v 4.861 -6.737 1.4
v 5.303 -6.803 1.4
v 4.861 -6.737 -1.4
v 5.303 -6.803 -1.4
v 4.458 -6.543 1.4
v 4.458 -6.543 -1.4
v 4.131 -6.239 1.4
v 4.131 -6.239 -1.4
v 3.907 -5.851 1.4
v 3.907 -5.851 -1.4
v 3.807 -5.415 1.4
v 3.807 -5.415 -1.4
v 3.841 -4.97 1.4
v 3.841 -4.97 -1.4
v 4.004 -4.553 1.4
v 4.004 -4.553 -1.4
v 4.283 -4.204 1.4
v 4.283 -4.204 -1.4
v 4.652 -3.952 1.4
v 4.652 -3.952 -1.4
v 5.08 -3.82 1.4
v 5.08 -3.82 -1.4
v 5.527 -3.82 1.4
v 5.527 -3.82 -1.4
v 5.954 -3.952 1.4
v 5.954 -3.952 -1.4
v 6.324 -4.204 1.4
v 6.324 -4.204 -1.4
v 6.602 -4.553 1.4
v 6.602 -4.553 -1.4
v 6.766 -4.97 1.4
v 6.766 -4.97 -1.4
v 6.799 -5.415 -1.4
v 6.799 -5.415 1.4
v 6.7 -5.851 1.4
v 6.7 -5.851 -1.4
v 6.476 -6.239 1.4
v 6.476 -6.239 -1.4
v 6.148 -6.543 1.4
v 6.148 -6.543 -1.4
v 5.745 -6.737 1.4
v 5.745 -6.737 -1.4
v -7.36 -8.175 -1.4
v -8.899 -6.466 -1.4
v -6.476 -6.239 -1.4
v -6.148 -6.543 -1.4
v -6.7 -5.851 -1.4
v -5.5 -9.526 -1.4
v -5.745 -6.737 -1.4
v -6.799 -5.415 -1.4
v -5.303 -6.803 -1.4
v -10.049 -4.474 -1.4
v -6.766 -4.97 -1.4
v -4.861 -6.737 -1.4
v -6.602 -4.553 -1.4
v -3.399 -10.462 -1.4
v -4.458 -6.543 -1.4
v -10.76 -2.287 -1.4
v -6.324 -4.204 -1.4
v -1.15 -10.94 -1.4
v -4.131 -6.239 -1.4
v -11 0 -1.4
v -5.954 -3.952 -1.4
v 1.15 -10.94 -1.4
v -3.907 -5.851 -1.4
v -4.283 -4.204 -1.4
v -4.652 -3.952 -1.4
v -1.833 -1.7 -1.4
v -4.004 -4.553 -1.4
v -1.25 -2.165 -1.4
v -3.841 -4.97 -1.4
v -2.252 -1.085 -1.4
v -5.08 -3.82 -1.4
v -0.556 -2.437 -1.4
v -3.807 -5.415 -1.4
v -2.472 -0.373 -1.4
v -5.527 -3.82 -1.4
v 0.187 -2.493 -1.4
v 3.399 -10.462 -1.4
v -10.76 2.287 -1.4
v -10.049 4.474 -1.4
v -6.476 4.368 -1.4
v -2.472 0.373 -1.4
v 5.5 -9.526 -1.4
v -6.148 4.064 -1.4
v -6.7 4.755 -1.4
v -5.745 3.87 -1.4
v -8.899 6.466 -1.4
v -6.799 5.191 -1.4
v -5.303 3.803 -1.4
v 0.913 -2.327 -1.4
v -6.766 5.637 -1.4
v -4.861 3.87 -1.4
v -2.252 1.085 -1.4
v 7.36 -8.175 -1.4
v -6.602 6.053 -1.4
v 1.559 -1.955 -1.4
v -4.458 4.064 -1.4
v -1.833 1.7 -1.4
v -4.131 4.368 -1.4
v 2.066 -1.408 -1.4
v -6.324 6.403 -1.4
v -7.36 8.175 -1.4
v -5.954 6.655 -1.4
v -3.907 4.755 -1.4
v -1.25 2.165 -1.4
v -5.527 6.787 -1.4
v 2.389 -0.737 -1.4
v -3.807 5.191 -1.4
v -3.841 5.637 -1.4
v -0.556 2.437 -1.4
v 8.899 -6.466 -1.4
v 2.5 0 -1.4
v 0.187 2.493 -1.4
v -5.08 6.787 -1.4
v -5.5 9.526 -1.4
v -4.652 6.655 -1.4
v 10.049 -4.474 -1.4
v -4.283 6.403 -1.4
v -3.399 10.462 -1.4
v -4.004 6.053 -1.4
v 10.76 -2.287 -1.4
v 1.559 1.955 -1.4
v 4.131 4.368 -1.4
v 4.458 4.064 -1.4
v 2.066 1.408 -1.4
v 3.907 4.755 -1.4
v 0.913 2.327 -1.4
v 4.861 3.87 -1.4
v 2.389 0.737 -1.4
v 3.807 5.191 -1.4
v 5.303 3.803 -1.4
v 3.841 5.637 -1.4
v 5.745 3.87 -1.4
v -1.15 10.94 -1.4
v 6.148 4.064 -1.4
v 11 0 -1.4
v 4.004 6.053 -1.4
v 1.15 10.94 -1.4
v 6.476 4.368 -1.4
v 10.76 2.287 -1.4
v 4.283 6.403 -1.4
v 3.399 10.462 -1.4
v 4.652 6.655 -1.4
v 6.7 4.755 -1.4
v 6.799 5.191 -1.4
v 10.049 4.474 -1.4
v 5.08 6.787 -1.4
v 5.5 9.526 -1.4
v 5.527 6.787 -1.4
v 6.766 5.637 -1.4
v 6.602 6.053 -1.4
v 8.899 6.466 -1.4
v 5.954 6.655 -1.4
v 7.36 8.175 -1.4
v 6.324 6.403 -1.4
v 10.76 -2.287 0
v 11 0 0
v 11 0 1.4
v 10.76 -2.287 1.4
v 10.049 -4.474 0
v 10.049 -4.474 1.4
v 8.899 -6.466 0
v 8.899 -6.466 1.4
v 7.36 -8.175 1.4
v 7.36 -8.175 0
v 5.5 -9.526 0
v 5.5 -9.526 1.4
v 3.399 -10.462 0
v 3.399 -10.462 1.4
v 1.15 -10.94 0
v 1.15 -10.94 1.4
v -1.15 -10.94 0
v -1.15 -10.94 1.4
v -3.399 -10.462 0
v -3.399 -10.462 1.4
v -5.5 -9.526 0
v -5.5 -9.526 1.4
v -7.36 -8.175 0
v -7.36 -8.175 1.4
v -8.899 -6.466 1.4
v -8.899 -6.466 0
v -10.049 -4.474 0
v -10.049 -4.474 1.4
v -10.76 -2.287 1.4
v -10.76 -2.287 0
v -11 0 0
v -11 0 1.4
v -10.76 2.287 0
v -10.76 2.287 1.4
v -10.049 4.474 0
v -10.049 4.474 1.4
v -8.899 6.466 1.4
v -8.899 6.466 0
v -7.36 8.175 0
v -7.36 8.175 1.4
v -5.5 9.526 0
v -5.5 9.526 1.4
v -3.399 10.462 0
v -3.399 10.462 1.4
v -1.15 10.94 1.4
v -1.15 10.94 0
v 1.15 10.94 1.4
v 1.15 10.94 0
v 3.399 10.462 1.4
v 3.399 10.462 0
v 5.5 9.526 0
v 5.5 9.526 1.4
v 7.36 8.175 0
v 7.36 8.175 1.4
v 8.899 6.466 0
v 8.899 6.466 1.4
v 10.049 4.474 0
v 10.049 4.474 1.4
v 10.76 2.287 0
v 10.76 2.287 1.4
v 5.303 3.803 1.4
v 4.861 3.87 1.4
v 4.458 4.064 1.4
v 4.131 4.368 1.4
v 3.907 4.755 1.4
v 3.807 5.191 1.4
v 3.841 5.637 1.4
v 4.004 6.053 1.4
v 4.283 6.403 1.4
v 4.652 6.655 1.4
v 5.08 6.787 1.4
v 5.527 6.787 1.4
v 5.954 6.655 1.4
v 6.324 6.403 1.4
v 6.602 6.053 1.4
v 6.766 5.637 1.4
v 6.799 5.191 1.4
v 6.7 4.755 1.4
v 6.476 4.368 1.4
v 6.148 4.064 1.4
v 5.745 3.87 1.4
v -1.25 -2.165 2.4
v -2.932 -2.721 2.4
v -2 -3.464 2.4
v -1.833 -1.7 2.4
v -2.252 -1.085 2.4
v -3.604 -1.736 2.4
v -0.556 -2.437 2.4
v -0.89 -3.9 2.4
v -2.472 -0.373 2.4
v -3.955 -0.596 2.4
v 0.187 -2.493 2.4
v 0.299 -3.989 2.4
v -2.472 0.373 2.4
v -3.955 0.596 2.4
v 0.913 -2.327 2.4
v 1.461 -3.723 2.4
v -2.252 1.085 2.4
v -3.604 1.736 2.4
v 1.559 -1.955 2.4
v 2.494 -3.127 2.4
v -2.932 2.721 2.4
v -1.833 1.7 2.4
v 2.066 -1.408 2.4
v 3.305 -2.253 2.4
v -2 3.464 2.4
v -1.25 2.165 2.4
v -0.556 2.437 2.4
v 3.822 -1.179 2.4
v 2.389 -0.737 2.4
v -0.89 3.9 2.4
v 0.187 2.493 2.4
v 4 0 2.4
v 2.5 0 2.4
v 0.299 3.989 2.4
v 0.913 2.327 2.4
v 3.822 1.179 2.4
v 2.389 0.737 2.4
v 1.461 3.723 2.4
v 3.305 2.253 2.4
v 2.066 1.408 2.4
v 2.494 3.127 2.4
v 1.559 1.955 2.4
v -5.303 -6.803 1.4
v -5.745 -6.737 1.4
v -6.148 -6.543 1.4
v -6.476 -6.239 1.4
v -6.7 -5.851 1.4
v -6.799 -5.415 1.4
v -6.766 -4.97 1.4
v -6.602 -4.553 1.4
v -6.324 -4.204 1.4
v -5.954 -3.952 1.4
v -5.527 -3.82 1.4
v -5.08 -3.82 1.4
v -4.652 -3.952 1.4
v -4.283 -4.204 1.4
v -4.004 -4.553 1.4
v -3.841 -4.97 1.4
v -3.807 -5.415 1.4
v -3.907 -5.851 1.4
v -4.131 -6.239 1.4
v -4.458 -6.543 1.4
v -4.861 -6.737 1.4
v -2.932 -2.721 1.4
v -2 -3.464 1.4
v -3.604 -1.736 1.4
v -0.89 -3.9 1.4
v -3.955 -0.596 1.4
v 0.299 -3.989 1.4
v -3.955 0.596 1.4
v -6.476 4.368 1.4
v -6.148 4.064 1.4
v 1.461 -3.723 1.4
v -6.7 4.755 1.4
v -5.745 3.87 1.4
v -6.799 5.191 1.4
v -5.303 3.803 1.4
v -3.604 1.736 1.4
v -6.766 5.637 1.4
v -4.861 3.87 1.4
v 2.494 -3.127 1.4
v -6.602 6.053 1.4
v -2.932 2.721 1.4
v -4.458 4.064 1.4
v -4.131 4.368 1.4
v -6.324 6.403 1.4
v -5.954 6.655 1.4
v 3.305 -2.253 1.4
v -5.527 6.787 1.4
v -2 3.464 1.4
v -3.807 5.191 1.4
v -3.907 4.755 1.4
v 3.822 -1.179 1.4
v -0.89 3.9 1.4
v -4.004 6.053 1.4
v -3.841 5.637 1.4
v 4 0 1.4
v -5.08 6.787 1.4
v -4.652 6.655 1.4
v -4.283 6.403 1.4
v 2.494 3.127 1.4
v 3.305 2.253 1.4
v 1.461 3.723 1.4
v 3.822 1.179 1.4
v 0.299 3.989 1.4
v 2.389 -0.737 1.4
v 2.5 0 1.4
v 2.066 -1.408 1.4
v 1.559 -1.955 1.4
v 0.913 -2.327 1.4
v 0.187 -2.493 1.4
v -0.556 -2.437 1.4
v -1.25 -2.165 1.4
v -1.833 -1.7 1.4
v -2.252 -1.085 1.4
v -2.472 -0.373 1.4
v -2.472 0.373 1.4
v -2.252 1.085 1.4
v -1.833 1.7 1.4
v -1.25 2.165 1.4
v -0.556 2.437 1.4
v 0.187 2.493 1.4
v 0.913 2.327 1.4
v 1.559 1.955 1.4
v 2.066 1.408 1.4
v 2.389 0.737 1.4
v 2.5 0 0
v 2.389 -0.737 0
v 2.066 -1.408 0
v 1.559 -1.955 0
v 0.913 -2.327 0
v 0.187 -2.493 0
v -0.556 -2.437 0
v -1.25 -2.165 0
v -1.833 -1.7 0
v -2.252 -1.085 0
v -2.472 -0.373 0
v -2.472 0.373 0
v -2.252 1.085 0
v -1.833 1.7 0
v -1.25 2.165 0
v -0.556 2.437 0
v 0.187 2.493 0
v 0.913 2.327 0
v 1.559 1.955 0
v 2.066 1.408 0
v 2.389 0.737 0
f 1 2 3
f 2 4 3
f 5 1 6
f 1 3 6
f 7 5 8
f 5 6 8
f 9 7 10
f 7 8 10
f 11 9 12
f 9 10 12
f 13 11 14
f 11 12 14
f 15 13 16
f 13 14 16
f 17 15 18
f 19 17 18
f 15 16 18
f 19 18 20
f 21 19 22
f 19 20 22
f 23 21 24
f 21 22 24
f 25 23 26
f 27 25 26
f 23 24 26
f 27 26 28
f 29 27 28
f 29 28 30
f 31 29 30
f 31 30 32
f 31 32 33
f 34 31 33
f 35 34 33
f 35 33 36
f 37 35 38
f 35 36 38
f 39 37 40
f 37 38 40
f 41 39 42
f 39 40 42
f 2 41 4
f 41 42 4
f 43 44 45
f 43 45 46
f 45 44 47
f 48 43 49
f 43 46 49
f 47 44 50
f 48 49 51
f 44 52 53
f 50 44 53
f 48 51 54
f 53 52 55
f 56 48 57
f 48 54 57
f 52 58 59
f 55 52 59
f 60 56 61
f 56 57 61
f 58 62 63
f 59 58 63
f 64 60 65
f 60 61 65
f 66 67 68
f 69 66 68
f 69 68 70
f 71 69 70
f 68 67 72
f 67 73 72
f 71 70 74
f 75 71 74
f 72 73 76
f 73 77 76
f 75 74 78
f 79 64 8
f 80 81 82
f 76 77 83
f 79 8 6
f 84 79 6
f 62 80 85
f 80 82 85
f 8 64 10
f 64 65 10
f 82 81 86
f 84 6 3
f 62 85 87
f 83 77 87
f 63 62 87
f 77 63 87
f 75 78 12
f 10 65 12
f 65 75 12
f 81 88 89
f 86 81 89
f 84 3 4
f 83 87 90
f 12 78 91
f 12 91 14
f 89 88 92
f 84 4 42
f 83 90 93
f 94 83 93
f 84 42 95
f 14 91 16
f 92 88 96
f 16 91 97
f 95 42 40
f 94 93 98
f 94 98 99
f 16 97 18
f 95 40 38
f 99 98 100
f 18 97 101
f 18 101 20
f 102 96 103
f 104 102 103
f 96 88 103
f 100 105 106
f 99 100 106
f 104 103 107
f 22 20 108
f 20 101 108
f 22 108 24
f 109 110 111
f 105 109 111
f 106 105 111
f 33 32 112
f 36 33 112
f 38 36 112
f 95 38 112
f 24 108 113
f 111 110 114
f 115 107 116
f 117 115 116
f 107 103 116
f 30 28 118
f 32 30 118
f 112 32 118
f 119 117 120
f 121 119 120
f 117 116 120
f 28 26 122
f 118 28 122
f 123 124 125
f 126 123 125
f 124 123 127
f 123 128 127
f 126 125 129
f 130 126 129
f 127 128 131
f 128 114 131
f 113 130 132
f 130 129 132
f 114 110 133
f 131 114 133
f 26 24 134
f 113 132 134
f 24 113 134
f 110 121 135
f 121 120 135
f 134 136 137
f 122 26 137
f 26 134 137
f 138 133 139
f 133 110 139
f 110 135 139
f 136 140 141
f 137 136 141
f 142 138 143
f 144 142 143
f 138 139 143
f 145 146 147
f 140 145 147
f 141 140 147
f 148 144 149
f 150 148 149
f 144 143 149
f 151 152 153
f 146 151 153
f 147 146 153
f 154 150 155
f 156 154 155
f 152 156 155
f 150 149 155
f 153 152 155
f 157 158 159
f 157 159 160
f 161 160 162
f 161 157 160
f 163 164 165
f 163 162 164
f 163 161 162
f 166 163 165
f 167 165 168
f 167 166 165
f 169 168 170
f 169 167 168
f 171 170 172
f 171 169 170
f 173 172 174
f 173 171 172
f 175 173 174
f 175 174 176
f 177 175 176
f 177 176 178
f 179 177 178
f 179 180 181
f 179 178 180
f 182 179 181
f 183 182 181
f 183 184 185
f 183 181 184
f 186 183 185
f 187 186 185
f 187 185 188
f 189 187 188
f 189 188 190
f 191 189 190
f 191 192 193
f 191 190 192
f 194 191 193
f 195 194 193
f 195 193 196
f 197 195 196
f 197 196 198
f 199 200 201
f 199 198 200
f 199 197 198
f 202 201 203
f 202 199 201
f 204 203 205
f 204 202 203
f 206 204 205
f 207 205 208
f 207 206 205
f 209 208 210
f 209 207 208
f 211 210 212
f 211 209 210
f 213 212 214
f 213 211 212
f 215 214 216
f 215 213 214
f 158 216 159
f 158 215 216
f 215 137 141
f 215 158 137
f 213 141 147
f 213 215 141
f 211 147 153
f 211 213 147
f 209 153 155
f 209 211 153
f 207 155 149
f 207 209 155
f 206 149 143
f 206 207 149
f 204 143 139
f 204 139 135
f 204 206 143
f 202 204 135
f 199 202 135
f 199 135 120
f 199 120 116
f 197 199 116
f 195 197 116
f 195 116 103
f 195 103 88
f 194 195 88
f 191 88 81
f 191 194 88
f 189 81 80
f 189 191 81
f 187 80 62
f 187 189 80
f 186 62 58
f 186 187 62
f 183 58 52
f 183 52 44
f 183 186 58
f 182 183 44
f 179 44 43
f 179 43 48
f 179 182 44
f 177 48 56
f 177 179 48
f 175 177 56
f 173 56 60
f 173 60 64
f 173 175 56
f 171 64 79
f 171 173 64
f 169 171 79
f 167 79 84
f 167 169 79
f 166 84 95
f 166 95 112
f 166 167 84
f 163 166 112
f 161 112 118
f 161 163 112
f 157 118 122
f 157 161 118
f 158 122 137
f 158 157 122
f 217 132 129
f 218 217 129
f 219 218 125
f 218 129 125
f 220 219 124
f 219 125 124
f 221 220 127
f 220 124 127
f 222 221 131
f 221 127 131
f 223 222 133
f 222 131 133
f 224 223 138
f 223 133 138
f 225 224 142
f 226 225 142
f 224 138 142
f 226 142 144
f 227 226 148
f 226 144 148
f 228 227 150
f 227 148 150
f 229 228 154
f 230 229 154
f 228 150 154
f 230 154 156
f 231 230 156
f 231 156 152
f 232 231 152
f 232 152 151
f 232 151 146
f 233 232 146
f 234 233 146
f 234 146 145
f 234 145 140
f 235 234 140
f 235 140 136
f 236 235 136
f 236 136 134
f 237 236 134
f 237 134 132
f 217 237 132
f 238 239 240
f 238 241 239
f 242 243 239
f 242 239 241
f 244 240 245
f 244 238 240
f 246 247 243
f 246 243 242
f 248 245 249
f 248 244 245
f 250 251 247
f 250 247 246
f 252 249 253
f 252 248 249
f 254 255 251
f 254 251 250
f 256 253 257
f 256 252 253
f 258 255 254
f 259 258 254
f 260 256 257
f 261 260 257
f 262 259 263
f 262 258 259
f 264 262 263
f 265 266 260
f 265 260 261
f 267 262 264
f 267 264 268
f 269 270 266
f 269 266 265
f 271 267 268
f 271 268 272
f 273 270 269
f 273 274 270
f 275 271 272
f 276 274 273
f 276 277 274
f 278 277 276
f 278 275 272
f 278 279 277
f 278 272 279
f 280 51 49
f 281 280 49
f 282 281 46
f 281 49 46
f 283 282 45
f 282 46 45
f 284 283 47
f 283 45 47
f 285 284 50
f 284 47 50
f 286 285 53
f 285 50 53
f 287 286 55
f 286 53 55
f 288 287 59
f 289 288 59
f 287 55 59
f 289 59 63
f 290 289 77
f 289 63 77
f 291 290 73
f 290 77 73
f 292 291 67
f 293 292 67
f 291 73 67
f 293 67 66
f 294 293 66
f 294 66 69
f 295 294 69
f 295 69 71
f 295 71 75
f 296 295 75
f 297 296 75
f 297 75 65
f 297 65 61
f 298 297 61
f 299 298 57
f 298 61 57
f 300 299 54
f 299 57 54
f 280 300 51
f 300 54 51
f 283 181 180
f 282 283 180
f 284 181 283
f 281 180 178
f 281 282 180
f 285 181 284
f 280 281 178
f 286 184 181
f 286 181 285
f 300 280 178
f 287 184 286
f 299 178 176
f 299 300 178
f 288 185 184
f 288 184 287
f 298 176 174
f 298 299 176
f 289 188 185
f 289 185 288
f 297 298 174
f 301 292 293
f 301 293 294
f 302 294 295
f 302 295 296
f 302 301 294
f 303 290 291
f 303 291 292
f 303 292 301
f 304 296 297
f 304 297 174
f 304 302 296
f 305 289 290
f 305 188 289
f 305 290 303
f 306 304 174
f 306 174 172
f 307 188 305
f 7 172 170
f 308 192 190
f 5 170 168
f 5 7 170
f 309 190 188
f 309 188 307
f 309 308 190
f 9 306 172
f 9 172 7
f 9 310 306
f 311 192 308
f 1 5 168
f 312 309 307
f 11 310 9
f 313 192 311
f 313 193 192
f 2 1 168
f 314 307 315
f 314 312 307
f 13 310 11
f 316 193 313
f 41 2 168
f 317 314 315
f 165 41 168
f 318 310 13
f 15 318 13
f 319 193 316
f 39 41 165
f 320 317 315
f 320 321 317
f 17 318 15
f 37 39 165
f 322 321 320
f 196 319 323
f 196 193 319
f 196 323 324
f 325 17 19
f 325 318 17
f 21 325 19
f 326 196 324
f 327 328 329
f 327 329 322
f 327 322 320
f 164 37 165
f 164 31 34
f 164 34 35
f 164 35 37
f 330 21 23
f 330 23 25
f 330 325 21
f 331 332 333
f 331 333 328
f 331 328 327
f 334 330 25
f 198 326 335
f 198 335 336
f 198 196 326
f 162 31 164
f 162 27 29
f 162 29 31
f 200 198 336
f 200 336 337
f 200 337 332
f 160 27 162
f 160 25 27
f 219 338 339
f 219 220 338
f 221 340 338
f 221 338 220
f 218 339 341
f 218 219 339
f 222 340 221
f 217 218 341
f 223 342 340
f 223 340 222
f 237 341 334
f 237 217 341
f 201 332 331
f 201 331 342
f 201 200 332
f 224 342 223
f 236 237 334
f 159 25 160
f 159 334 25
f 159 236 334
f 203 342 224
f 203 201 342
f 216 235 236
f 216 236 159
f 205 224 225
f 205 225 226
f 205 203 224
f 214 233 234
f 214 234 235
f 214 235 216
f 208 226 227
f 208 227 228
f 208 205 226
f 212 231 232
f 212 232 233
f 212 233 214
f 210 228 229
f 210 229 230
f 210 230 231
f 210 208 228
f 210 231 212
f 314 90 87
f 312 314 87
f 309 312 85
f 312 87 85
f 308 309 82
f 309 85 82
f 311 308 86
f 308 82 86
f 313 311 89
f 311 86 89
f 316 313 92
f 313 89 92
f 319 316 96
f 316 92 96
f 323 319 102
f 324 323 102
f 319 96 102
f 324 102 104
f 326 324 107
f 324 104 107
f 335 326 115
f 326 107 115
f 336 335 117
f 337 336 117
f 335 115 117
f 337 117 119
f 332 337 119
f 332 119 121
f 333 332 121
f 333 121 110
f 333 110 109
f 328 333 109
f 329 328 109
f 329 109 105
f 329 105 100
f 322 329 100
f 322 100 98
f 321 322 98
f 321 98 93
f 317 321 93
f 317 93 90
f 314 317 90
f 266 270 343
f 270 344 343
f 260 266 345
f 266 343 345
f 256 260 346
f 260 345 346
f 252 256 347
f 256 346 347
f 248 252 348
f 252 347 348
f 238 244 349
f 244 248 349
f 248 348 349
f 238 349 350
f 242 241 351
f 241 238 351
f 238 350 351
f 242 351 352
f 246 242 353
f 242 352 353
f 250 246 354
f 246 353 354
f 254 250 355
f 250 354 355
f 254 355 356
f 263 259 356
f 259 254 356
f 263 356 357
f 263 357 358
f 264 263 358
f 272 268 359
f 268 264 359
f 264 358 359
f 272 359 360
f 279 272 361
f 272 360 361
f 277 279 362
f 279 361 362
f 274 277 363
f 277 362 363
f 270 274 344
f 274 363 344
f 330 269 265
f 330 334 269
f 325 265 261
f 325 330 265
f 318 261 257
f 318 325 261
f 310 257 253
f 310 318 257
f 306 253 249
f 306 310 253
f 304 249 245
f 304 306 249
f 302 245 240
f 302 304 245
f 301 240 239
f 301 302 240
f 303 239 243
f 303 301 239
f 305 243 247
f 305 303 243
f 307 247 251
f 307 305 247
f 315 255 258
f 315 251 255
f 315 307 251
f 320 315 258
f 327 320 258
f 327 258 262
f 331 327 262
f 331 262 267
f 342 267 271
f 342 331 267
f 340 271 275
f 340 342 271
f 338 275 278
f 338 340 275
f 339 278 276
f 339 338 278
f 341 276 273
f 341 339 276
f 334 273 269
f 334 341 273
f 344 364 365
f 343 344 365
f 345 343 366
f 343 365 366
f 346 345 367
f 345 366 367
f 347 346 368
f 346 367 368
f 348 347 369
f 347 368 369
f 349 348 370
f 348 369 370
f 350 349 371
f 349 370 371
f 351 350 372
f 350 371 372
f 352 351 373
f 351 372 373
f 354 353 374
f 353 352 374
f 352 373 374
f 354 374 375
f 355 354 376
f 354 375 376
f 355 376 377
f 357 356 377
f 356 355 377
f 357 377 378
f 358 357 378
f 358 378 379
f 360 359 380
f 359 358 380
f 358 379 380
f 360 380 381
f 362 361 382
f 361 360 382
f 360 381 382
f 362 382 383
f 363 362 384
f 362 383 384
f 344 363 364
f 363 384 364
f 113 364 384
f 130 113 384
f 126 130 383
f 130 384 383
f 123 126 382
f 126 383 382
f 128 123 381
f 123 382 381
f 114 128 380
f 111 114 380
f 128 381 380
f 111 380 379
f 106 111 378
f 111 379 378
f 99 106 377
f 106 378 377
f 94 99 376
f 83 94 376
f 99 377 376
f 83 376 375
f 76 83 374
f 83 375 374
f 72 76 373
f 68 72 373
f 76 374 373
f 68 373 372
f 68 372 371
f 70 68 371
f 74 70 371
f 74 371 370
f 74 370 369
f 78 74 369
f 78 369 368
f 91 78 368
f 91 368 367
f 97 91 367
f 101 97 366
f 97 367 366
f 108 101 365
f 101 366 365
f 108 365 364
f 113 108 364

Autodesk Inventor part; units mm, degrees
ref_plane "YZ Plane" through (0, 0, 0) normal (1, 0, 0) x (0, 1, 0)
ref_plane "XZ Plane" through (0, 0, 0) normal (0, 1, 0) x (-1, 0, 0)
ref_plane "XY Plane" through (0, 0, 0) normal (0, 0, 1) x (1, 0, 0)
sketch "Sketch1" plane through (0, 0, 0) normal (0, 0, 1) x (1, 0, 0)
  circle A0 centre (0, 0) radius 11
  circle A1 centre (0, 0) radius 2.5
  dimension "d0" = 22
  dimension "d1" = 5
extrude "Extrusion1" add sketch "Sketch1" along normal mid plane 2.8
sketch "Sketch2" plane through (0, 0, 1.4) normal (0, 0, 1) x (1, 0, 0)
  circle A0 centre (0, 0) radius 7.5 construction
  point P0 (-5.3033, 5.3033)
  point P1 (5.3033, 5.3033)
  point P2 (-5.3033, -5.3033)
  point P3 (5.3033, -5.3033)
  dimension "d4" = 15
  dimension "d5" = 90
hole "Hole1" at (-5.3033, 5.3033, 1.4) at (5.3033, 5.3033, 1.4) at (-5.3033, -5.3033, 1.4) at (5.3033, -5.3033, 1.4) direction (0, 0, -1) diameter 3 end through all
sketch "Sketch3" plane through (0, 0, 1.4) normal (0, 0, 1) x (1, 0, 0)
  circle A0 centre (0, 0) radius 4
  circle A1 centre (0, 0) radius 2.5 projected
  dimension "d13" = 8
extrude "Extrusion2" add sketch "Sketch3" along normal blind 1
properties part number "shaftmount"
